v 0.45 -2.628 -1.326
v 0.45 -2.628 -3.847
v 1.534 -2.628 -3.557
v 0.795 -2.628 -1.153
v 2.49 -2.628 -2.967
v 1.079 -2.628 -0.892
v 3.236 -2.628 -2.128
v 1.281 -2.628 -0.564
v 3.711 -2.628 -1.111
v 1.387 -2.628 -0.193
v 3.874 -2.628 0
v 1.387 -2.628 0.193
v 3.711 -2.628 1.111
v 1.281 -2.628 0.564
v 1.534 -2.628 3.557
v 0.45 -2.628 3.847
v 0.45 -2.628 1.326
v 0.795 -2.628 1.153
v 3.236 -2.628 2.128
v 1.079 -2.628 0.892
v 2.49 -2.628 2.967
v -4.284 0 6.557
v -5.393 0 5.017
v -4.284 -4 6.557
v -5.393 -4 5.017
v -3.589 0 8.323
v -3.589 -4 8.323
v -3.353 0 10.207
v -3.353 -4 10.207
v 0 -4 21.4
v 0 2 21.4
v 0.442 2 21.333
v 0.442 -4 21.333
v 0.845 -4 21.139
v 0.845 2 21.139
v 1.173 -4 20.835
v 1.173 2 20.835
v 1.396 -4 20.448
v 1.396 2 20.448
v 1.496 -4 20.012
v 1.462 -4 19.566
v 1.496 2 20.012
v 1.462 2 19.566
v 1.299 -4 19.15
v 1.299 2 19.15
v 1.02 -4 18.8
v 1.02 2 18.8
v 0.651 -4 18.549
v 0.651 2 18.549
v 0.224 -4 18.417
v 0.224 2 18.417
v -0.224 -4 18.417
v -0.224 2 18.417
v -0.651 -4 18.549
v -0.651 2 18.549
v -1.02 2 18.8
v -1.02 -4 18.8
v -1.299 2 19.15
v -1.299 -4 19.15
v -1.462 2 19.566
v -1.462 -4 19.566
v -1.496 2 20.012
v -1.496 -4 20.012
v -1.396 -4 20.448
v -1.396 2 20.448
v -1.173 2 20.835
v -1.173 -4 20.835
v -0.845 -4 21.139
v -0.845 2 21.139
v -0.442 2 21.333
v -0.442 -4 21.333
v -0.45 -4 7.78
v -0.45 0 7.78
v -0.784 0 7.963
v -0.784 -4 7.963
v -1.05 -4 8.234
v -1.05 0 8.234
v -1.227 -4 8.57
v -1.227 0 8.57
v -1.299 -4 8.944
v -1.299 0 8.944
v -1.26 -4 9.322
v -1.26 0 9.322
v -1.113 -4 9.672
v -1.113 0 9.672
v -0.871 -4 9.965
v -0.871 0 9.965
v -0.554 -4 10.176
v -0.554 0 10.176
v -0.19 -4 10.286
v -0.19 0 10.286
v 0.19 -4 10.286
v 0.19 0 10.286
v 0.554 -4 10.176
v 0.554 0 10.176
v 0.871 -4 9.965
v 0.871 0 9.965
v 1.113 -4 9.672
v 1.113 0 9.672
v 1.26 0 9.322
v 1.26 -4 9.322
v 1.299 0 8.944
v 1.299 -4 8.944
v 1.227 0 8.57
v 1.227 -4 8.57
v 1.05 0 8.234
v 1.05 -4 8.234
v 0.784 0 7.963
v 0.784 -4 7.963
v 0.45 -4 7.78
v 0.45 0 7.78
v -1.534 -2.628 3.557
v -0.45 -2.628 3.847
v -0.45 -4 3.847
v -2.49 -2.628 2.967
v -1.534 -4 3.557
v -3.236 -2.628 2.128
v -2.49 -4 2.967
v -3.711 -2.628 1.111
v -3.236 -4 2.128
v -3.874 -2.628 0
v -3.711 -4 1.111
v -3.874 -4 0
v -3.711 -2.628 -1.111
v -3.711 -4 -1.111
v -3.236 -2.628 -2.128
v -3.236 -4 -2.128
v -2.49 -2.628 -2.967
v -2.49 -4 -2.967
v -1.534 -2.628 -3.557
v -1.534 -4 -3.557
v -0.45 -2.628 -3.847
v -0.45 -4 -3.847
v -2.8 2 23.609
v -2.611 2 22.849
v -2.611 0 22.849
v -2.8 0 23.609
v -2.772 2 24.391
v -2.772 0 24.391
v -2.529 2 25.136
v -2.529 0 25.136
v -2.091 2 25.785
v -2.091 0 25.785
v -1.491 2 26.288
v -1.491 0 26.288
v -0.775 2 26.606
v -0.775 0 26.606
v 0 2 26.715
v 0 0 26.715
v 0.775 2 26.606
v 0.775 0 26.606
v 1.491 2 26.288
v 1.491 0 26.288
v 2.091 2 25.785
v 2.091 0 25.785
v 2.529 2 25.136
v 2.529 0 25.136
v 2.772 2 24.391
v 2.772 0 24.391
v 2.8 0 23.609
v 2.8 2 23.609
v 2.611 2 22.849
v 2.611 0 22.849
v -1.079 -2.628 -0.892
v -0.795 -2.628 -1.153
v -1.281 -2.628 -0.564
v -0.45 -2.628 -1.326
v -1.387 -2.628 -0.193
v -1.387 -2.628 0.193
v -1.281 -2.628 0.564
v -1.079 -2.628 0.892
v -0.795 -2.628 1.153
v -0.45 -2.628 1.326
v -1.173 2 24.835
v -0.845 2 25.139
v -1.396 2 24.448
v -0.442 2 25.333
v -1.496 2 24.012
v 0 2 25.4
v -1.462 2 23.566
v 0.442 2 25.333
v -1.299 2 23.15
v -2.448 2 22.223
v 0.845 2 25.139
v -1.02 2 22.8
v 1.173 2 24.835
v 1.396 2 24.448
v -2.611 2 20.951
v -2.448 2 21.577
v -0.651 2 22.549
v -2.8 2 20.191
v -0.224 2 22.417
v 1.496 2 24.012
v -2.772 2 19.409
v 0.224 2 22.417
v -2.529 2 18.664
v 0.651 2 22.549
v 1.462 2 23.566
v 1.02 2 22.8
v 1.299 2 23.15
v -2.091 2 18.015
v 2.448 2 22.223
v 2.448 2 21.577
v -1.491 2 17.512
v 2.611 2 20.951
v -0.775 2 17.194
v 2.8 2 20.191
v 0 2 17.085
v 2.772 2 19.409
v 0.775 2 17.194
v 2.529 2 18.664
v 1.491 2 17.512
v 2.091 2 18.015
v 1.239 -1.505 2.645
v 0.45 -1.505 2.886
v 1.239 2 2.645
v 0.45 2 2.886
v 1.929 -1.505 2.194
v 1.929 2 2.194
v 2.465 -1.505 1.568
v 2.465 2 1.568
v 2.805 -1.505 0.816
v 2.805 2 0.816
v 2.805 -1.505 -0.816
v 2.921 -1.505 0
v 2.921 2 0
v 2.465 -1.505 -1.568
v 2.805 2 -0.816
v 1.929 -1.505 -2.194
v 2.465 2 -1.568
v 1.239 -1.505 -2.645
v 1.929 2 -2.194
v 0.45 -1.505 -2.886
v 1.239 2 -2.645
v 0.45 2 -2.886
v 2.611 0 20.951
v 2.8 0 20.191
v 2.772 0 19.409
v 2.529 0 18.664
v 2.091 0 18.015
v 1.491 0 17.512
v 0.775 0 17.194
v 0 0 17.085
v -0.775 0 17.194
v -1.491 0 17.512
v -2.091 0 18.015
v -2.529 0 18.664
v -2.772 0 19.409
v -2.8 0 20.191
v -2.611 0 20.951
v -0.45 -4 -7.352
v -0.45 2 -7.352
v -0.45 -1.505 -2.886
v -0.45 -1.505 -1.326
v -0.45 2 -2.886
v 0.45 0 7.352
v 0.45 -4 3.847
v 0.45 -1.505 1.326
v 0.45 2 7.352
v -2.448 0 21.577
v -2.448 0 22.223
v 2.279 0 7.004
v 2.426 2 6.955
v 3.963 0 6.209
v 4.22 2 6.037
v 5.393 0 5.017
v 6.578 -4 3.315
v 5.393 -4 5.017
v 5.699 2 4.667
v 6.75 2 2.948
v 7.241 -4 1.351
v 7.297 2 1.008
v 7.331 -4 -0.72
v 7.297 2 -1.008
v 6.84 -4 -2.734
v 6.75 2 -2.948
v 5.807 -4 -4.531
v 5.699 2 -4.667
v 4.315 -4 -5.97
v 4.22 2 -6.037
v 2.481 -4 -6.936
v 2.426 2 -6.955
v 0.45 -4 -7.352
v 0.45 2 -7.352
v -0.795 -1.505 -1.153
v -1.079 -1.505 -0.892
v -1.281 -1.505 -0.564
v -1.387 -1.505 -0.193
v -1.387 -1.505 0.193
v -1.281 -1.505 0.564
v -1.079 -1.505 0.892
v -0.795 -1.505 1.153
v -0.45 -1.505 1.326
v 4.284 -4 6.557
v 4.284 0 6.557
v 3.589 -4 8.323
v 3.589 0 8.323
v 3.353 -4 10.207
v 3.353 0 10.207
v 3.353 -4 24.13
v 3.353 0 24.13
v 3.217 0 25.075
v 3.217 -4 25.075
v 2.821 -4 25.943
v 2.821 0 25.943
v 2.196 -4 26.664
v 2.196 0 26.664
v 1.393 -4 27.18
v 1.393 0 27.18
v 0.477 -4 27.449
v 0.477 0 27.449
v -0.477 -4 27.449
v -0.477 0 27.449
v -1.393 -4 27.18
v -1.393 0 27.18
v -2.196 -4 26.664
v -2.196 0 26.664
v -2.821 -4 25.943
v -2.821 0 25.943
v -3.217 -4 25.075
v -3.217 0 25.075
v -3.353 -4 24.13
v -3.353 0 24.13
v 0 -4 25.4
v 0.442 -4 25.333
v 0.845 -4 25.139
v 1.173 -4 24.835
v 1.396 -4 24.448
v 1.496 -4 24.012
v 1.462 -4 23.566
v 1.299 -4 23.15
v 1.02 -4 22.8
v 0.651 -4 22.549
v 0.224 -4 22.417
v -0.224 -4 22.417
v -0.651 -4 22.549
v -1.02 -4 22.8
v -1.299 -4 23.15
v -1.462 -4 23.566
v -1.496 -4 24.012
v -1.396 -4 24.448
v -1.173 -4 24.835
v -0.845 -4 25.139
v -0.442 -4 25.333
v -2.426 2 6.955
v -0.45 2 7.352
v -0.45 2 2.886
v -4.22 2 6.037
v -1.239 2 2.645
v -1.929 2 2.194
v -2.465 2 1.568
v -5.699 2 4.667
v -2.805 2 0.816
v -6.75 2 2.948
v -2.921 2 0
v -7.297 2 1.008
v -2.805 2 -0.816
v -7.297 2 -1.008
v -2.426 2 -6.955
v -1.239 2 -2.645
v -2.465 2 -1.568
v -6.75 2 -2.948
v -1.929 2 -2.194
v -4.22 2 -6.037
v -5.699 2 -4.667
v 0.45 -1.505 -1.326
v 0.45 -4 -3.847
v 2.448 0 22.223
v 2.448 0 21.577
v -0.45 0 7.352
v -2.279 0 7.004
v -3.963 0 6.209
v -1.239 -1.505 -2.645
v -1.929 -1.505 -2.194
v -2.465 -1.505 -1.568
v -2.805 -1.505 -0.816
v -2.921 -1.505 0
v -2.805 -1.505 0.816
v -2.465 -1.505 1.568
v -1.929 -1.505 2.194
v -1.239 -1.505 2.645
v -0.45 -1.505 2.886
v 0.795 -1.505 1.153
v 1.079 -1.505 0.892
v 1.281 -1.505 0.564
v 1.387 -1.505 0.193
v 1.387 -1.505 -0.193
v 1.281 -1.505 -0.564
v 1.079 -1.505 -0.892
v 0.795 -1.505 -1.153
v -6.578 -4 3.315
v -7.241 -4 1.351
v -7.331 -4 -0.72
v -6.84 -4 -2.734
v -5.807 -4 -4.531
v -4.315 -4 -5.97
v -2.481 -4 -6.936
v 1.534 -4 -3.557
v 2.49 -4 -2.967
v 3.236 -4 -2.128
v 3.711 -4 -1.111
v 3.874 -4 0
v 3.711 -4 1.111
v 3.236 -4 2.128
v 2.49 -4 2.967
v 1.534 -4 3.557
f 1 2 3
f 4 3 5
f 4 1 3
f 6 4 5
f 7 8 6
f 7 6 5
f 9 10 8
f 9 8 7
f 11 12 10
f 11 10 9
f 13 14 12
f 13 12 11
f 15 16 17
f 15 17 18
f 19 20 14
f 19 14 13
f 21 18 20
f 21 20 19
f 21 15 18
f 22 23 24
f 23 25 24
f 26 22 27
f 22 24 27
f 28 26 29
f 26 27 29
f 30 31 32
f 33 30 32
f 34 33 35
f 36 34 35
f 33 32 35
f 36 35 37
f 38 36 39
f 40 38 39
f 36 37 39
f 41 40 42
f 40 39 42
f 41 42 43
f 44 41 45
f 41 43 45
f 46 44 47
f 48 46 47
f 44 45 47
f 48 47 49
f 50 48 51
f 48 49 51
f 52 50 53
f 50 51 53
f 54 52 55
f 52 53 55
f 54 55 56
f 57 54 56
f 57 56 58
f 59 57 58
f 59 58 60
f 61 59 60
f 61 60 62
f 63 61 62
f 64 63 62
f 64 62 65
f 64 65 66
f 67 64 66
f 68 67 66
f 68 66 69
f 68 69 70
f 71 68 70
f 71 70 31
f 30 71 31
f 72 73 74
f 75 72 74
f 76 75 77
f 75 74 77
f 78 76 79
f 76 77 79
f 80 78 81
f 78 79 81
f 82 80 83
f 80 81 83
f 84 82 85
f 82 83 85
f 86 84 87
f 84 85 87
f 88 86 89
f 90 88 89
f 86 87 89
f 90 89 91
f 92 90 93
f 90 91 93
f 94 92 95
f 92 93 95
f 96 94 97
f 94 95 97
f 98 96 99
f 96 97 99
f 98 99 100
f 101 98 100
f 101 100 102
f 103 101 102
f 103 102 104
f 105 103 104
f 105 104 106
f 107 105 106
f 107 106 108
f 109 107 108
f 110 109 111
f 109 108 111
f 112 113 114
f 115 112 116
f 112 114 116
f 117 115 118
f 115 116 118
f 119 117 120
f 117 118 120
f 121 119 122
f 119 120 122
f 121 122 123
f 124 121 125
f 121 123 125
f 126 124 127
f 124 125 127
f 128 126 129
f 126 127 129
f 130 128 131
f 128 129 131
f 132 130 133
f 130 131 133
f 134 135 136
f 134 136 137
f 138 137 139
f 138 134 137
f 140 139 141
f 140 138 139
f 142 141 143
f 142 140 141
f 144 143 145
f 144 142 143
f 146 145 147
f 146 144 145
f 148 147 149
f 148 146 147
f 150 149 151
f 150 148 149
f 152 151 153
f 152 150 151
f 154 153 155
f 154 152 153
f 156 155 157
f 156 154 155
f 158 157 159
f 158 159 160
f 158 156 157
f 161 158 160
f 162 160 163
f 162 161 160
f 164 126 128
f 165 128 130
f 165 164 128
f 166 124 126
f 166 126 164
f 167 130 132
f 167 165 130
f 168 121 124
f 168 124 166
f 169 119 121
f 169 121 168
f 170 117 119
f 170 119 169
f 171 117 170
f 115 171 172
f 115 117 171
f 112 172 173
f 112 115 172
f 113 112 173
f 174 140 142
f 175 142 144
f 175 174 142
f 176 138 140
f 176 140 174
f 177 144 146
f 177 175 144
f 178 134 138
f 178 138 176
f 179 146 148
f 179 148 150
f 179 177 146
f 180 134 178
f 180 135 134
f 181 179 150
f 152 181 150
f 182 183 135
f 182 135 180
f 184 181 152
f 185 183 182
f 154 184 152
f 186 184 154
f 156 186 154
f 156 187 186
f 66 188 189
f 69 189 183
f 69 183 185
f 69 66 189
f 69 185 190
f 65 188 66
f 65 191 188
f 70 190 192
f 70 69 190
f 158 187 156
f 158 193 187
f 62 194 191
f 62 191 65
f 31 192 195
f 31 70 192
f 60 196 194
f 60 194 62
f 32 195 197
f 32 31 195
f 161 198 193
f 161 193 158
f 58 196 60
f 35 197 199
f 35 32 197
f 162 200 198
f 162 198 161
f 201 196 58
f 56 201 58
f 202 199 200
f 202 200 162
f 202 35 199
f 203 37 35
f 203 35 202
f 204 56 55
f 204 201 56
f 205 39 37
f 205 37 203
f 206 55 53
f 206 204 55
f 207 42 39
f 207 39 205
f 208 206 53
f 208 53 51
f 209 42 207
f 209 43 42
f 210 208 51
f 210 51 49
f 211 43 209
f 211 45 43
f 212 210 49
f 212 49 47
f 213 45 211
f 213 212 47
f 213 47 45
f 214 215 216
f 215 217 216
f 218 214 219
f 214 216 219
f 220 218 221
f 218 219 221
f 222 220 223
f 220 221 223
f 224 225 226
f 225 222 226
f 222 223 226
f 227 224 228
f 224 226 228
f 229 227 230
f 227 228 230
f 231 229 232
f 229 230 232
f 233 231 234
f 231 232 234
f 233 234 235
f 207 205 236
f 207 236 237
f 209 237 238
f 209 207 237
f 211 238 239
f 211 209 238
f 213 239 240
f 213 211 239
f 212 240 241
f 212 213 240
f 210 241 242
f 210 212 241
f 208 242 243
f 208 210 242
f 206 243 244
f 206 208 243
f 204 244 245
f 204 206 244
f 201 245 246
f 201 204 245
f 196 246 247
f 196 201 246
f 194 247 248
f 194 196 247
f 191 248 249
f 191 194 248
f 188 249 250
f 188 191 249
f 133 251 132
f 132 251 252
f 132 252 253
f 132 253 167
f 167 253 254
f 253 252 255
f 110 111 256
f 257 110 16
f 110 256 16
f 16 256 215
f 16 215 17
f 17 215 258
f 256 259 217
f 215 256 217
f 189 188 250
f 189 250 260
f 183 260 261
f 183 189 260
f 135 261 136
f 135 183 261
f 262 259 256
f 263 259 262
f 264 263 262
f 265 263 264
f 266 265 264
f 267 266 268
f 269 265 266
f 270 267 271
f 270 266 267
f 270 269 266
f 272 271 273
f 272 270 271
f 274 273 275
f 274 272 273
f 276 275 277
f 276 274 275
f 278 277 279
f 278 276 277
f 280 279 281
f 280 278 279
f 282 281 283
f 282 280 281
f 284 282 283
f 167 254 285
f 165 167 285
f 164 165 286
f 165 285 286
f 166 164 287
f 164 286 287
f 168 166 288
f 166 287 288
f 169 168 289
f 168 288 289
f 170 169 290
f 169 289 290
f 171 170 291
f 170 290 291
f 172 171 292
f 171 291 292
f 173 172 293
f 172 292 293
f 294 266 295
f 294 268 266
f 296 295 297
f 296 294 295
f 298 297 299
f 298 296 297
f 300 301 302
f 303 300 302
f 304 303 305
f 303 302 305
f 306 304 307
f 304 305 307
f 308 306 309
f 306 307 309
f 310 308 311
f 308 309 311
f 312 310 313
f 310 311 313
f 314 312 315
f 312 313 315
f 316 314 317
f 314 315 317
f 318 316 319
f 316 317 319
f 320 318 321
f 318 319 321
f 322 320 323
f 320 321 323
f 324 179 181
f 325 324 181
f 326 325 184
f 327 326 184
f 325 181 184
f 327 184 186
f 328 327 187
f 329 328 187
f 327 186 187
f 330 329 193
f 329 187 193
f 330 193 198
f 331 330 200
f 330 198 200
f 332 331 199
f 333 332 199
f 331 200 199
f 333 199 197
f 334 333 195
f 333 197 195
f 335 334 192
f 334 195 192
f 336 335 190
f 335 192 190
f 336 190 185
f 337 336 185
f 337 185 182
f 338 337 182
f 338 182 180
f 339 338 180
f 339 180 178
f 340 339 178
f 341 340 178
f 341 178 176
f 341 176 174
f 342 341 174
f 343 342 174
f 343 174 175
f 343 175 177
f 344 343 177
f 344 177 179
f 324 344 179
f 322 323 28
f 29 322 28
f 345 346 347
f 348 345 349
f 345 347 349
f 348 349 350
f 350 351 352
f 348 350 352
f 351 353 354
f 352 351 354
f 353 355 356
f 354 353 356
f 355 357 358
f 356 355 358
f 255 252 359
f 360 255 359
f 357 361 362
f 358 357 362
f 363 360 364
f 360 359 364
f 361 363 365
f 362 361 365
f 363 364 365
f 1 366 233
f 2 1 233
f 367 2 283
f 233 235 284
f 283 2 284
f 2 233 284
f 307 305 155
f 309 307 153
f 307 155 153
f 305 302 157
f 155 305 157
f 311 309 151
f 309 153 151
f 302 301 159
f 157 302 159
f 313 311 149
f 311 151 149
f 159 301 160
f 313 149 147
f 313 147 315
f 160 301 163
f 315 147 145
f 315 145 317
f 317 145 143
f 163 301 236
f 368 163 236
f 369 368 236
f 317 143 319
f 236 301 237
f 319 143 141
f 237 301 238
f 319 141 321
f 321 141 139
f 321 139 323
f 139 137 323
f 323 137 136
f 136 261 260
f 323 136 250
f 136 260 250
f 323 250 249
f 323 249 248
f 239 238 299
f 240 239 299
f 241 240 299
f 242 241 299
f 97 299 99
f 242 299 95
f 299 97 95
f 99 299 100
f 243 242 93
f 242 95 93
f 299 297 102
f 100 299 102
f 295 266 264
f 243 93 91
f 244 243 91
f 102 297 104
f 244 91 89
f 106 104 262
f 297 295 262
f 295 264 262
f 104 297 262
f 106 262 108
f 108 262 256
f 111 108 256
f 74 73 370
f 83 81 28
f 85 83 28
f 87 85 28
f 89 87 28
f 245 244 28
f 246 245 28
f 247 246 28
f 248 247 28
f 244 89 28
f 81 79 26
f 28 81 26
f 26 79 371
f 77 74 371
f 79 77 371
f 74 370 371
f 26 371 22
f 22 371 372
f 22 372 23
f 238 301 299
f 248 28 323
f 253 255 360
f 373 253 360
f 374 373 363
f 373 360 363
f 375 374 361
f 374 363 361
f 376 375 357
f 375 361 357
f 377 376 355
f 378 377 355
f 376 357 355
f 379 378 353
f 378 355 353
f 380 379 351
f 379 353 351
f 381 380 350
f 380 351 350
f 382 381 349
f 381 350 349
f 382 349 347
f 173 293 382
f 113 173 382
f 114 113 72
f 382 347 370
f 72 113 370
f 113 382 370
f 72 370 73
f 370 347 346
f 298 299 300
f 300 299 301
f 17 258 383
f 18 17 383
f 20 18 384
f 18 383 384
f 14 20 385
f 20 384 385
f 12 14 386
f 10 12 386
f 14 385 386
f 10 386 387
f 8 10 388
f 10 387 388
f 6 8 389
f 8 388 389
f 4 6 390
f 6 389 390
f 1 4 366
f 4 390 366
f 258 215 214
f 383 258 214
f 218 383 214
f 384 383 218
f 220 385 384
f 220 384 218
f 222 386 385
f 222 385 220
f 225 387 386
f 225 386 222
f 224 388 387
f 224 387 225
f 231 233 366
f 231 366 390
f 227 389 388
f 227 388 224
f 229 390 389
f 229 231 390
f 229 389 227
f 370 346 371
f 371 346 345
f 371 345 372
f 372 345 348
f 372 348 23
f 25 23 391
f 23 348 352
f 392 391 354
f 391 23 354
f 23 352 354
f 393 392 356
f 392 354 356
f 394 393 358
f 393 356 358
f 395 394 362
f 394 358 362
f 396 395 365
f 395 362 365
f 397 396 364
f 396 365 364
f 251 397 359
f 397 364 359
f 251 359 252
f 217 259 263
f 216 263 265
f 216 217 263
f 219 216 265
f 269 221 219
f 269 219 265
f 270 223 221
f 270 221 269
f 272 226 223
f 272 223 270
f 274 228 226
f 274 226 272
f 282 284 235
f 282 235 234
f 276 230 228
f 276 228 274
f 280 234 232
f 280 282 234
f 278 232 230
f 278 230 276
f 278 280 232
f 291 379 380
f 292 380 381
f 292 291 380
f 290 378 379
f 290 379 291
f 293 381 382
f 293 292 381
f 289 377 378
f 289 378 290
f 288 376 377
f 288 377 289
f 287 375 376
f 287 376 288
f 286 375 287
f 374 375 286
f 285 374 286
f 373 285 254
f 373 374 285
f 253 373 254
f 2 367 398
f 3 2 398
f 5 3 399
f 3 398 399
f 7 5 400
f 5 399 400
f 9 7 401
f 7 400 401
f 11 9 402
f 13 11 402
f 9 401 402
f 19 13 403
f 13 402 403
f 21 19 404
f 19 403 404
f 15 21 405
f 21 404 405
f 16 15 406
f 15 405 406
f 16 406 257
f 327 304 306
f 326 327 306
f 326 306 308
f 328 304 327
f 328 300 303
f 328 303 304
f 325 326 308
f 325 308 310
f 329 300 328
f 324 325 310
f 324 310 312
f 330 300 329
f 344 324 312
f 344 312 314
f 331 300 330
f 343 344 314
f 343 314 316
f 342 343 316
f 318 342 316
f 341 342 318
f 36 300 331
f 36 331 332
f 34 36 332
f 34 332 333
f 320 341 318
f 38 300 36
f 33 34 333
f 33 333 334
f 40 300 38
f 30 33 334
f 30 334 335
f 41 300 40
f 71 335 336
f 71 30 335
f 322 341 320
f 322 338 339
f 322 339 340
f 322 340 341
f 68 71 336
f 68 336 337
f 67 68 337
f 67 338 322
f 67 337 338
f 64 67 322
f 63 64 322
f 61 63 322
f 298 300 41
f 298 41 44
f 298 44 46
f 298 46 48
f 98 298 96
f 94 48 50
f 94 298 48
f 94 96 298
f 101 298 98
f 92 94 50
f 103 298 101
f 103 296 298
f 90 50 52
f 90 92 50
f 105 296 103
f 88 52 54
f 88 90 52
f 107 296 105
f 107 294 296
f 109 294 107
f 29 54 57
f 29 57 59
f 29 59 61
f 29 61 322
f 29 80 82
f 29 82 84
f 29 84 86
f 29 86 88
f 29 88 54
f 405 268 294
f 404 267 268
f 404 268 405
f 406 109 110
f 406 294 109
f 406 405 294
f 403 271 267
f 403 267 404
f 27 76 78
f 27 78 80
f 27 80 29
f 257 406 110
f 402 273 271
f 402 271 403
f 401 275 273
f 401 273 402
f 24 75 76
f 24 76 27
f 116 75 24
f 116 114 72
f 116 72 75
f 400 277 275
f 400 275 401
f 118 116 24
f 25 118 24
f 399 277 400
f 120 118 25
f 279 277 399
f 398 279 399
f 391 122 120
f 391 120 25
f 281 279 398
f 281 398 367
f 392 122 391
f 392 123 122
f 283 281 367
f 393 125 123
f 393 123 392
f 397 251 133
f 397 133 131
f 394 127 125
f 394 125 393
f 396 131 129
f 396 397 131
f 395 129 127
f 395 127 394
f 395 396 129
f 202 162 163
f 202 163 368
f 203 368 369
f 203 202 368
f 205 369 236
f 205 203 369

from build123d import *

# Parameters (mm, degrees)
SKETCH1_R           = 1.5000000000000018
SKETCH1_R_2         = 1.5000000000000004
BOSS_EXTRUDE1_DEPTH = 4
BOSS_EXTRUDE2_START = 2
BOSS_EXTRUDE2_DEPTH = 2
BOSS_EXTRUDE3_START = 2
SKETCH3_R           = 1.5000000000000007
SKETCH3_R_2         = 1.500000000000001
BOSS_EXTRUDE3_DEPTH = 2
SKETCH4_R           = 2.921
CUT_EXTRUDE1_DEPTH  = 3.5052
FILLET1_R           = 7.62
SKETCH5_R           = 3.8735000000000004
CUT_EXTRUDE2_DEPTH  = 1.3716


with BuildPart() as part:
    # Sketch1 → Boss-Extrude1 (new body)
    with BuildSketch(Plane(origin=(0, 0, 0), x_dir=(1, 0, 0), z_dir=(0, 1, 0))):
        with BuildLine():
            Line((-3.3528000000000002, -24.130000000000003), (-3.3527999999999993, -6.55871086113727))
            ThreePointArc((-3.3527999999999993, -6.55871086113727), (-7.210684523422123, 1.504654346911835), (-0.45, 7.352241562952077))
            Line((-0.45, 7.352241562952077), (-0.45, 1.325707358356285))
            ThreePointArc((-0.45, 1.325707358356285), (-1.4, 1.7e-16), (-0.45, -1.325707358356285))
            Line((-0.45, -1.325707358356285), (-0.45, -7.780368908234952))
            ThreePointArc((-0.45, -7.780368908234952), (-2.4e-16, -10.3), (0.45000000000000184, -7.780368908234953))
            Line((0.45000000000000184, -7.780368908234953), (0.45000000000000107, -1.3257073583562848))
            ThreePointArc((0.45000000000000107, -1.3257073583562848), (1.4, 0), (0.45000000000000073, 1.3257073583562848))
            Line((0.45000000000000073, 1.3257073583562848), (0.45, 7.352241562952076))
            ThreePointArc((0.45, 7.352241562952076), (7.210684523422123, 1.504654346911832), (3.3527999999999993, -6.55871086113727))
            Line((3.3527999999999993, -6.55871086113727), (3.3528000000000002, -24.130000000000003))
            ThreePointArc((3.3528000000000002, -24.130000000000003), (-6.2e-16, -27.482800000000005), (-3.3528000000000002, -24.130000000000003))
        make_face()
        with Locations(Location((-4.6e-16, -23.9, 0), (0, 0, 270))):
            Circle(SKETCH1_R, mode=Mode.SUBTRACT)
        with Locations(Location((0, -19.9, 0), (0, 0, 270))):
            Circle(SKETCH1_R_2, mode=Mode.SUBTRACT)
    extrude(amount=-BOSS_EXTRUDE1_DEPTH)

    # Sketch2 → Boss-Extrude2 (add)
    with BuildSketch(Plane(origin=(0, 0, 0), x_dir=(1, 0, 0), z_dir=(0, 1, 0)).offset(BOSS_EXTRUDE2_START)):
        with BuildLine():
            Line((-0.44999999999999873, 7.352241562952076), (-0.4499999999999986, 1.325707358356285))
            ThreePointArc((-0.4499999999999986, 1.325707358356285), (-1.3999999999999995, 1.7e-16), (-0.4499999999999986, -1.3257073583562848))
            Line((-0.4499999999999986, -1.3257073583562848), (-0.44999999999999873, -7.352241562952076))
            ThreePointArc((-0.44999999999999873, -7.352241562952076), (-7.366, 9e-16), (-0.44999999999999873, 7.352241562952076))
        make_face()
        with BuildLine():
            Line((0.45, 7.352241562952076), (0.4499999999999999, 1.3257073583562846))
            ThreePointArc((0.4499999999999999, 1.3257073583562846), (1.3999999999999995, 0), (0.4499999999999999, -1.3257073583562846))
            Line((0.4499999999999999, -1.3257073583562846), (0.45, -7.352241562952076))
            ThreePointArc((0.45, -7.352241562952076), (7.366, 0), (0.45, 7.352241562952076))
        make_face()
    extrude(amount=-BOSS_EXTRUDE2_DEPTH)

    # Sketch3 → Boss-Extrude3 (add)
    with BuildSketch(Plane(origin=(0, 0, 0), x_dir=(1, 0, 0), z_dir=(0, 1, 0)).offset(BOSS_EXTRUDE3_START)):
        with BuildLine():
            ThreePointArc((2.611298533252736, -20.95135387488328), (8e-16, -17.085), (-2.6112985332527363, -20.95135387488328))
            ThreePointArc((-2.6112985332527363, -20.95135387488328), (-2.427496854553608, -21.899999999999995), (-2.611298533252737, -22.84864612511671))
            ThreePointArc((-2.611298533252737, -22.84864612511671), (-9.8e-16, -26.715), (2.611298533252737, -22.84864612511671))
            ThreePointArc((2.611298533252737, -22.84864612511671), (2.427496854553609, -21.899999999999995), (2.611298533252736, -20.95135387488328))
        make_face()
        with Locations(Location((0, -19.9, 0), (0, 0, 270))):
            Circle(SKETCH3_R, mode=Mode.SUBTRACT)
        with Locations(Location((-4.6e-16, -23.9, 0), (0, 0, 270))):
            Circle(SKETCH3_R_2, mode=Mode.SUBTRACT)
    extrude(amount=-BOSS_EXTRUDE3_DEPTH)

    # Sketch4 → Cut-Extrude1 (cut)
    with BuildSketch(Plane(origin=(0, 2, 0), x_dir=(1, 0, 0), z_dir=(0, 1, 0))):
        Circle(SKETCH4_R)
    extrude(amount=-CUT_EXTRUDE1_DEPTH, mode=Mode.SUBTRACT)

    # Fillet1
    fillet1_edges = [part.edges().sort_by_distance(p)[0] for p in [
        (-3.3527999999999993, -2, 6.558710861137271),
        (3.352800000000001, -2, 6.55871086113727),
    ]]
    fillet(fillet1_edges, radius=FILLET1_R)

    # Sketch5 → Cut-Extrude2 (cut)
    with BuildSketch(Plane.XZ.offset(4)):
        Circle(SKETCH5_R)
    extrude(amount=-CUT_EXTRUDE2_DEPTH, mode=Mode.SUBTRACT)


solid = part.part
